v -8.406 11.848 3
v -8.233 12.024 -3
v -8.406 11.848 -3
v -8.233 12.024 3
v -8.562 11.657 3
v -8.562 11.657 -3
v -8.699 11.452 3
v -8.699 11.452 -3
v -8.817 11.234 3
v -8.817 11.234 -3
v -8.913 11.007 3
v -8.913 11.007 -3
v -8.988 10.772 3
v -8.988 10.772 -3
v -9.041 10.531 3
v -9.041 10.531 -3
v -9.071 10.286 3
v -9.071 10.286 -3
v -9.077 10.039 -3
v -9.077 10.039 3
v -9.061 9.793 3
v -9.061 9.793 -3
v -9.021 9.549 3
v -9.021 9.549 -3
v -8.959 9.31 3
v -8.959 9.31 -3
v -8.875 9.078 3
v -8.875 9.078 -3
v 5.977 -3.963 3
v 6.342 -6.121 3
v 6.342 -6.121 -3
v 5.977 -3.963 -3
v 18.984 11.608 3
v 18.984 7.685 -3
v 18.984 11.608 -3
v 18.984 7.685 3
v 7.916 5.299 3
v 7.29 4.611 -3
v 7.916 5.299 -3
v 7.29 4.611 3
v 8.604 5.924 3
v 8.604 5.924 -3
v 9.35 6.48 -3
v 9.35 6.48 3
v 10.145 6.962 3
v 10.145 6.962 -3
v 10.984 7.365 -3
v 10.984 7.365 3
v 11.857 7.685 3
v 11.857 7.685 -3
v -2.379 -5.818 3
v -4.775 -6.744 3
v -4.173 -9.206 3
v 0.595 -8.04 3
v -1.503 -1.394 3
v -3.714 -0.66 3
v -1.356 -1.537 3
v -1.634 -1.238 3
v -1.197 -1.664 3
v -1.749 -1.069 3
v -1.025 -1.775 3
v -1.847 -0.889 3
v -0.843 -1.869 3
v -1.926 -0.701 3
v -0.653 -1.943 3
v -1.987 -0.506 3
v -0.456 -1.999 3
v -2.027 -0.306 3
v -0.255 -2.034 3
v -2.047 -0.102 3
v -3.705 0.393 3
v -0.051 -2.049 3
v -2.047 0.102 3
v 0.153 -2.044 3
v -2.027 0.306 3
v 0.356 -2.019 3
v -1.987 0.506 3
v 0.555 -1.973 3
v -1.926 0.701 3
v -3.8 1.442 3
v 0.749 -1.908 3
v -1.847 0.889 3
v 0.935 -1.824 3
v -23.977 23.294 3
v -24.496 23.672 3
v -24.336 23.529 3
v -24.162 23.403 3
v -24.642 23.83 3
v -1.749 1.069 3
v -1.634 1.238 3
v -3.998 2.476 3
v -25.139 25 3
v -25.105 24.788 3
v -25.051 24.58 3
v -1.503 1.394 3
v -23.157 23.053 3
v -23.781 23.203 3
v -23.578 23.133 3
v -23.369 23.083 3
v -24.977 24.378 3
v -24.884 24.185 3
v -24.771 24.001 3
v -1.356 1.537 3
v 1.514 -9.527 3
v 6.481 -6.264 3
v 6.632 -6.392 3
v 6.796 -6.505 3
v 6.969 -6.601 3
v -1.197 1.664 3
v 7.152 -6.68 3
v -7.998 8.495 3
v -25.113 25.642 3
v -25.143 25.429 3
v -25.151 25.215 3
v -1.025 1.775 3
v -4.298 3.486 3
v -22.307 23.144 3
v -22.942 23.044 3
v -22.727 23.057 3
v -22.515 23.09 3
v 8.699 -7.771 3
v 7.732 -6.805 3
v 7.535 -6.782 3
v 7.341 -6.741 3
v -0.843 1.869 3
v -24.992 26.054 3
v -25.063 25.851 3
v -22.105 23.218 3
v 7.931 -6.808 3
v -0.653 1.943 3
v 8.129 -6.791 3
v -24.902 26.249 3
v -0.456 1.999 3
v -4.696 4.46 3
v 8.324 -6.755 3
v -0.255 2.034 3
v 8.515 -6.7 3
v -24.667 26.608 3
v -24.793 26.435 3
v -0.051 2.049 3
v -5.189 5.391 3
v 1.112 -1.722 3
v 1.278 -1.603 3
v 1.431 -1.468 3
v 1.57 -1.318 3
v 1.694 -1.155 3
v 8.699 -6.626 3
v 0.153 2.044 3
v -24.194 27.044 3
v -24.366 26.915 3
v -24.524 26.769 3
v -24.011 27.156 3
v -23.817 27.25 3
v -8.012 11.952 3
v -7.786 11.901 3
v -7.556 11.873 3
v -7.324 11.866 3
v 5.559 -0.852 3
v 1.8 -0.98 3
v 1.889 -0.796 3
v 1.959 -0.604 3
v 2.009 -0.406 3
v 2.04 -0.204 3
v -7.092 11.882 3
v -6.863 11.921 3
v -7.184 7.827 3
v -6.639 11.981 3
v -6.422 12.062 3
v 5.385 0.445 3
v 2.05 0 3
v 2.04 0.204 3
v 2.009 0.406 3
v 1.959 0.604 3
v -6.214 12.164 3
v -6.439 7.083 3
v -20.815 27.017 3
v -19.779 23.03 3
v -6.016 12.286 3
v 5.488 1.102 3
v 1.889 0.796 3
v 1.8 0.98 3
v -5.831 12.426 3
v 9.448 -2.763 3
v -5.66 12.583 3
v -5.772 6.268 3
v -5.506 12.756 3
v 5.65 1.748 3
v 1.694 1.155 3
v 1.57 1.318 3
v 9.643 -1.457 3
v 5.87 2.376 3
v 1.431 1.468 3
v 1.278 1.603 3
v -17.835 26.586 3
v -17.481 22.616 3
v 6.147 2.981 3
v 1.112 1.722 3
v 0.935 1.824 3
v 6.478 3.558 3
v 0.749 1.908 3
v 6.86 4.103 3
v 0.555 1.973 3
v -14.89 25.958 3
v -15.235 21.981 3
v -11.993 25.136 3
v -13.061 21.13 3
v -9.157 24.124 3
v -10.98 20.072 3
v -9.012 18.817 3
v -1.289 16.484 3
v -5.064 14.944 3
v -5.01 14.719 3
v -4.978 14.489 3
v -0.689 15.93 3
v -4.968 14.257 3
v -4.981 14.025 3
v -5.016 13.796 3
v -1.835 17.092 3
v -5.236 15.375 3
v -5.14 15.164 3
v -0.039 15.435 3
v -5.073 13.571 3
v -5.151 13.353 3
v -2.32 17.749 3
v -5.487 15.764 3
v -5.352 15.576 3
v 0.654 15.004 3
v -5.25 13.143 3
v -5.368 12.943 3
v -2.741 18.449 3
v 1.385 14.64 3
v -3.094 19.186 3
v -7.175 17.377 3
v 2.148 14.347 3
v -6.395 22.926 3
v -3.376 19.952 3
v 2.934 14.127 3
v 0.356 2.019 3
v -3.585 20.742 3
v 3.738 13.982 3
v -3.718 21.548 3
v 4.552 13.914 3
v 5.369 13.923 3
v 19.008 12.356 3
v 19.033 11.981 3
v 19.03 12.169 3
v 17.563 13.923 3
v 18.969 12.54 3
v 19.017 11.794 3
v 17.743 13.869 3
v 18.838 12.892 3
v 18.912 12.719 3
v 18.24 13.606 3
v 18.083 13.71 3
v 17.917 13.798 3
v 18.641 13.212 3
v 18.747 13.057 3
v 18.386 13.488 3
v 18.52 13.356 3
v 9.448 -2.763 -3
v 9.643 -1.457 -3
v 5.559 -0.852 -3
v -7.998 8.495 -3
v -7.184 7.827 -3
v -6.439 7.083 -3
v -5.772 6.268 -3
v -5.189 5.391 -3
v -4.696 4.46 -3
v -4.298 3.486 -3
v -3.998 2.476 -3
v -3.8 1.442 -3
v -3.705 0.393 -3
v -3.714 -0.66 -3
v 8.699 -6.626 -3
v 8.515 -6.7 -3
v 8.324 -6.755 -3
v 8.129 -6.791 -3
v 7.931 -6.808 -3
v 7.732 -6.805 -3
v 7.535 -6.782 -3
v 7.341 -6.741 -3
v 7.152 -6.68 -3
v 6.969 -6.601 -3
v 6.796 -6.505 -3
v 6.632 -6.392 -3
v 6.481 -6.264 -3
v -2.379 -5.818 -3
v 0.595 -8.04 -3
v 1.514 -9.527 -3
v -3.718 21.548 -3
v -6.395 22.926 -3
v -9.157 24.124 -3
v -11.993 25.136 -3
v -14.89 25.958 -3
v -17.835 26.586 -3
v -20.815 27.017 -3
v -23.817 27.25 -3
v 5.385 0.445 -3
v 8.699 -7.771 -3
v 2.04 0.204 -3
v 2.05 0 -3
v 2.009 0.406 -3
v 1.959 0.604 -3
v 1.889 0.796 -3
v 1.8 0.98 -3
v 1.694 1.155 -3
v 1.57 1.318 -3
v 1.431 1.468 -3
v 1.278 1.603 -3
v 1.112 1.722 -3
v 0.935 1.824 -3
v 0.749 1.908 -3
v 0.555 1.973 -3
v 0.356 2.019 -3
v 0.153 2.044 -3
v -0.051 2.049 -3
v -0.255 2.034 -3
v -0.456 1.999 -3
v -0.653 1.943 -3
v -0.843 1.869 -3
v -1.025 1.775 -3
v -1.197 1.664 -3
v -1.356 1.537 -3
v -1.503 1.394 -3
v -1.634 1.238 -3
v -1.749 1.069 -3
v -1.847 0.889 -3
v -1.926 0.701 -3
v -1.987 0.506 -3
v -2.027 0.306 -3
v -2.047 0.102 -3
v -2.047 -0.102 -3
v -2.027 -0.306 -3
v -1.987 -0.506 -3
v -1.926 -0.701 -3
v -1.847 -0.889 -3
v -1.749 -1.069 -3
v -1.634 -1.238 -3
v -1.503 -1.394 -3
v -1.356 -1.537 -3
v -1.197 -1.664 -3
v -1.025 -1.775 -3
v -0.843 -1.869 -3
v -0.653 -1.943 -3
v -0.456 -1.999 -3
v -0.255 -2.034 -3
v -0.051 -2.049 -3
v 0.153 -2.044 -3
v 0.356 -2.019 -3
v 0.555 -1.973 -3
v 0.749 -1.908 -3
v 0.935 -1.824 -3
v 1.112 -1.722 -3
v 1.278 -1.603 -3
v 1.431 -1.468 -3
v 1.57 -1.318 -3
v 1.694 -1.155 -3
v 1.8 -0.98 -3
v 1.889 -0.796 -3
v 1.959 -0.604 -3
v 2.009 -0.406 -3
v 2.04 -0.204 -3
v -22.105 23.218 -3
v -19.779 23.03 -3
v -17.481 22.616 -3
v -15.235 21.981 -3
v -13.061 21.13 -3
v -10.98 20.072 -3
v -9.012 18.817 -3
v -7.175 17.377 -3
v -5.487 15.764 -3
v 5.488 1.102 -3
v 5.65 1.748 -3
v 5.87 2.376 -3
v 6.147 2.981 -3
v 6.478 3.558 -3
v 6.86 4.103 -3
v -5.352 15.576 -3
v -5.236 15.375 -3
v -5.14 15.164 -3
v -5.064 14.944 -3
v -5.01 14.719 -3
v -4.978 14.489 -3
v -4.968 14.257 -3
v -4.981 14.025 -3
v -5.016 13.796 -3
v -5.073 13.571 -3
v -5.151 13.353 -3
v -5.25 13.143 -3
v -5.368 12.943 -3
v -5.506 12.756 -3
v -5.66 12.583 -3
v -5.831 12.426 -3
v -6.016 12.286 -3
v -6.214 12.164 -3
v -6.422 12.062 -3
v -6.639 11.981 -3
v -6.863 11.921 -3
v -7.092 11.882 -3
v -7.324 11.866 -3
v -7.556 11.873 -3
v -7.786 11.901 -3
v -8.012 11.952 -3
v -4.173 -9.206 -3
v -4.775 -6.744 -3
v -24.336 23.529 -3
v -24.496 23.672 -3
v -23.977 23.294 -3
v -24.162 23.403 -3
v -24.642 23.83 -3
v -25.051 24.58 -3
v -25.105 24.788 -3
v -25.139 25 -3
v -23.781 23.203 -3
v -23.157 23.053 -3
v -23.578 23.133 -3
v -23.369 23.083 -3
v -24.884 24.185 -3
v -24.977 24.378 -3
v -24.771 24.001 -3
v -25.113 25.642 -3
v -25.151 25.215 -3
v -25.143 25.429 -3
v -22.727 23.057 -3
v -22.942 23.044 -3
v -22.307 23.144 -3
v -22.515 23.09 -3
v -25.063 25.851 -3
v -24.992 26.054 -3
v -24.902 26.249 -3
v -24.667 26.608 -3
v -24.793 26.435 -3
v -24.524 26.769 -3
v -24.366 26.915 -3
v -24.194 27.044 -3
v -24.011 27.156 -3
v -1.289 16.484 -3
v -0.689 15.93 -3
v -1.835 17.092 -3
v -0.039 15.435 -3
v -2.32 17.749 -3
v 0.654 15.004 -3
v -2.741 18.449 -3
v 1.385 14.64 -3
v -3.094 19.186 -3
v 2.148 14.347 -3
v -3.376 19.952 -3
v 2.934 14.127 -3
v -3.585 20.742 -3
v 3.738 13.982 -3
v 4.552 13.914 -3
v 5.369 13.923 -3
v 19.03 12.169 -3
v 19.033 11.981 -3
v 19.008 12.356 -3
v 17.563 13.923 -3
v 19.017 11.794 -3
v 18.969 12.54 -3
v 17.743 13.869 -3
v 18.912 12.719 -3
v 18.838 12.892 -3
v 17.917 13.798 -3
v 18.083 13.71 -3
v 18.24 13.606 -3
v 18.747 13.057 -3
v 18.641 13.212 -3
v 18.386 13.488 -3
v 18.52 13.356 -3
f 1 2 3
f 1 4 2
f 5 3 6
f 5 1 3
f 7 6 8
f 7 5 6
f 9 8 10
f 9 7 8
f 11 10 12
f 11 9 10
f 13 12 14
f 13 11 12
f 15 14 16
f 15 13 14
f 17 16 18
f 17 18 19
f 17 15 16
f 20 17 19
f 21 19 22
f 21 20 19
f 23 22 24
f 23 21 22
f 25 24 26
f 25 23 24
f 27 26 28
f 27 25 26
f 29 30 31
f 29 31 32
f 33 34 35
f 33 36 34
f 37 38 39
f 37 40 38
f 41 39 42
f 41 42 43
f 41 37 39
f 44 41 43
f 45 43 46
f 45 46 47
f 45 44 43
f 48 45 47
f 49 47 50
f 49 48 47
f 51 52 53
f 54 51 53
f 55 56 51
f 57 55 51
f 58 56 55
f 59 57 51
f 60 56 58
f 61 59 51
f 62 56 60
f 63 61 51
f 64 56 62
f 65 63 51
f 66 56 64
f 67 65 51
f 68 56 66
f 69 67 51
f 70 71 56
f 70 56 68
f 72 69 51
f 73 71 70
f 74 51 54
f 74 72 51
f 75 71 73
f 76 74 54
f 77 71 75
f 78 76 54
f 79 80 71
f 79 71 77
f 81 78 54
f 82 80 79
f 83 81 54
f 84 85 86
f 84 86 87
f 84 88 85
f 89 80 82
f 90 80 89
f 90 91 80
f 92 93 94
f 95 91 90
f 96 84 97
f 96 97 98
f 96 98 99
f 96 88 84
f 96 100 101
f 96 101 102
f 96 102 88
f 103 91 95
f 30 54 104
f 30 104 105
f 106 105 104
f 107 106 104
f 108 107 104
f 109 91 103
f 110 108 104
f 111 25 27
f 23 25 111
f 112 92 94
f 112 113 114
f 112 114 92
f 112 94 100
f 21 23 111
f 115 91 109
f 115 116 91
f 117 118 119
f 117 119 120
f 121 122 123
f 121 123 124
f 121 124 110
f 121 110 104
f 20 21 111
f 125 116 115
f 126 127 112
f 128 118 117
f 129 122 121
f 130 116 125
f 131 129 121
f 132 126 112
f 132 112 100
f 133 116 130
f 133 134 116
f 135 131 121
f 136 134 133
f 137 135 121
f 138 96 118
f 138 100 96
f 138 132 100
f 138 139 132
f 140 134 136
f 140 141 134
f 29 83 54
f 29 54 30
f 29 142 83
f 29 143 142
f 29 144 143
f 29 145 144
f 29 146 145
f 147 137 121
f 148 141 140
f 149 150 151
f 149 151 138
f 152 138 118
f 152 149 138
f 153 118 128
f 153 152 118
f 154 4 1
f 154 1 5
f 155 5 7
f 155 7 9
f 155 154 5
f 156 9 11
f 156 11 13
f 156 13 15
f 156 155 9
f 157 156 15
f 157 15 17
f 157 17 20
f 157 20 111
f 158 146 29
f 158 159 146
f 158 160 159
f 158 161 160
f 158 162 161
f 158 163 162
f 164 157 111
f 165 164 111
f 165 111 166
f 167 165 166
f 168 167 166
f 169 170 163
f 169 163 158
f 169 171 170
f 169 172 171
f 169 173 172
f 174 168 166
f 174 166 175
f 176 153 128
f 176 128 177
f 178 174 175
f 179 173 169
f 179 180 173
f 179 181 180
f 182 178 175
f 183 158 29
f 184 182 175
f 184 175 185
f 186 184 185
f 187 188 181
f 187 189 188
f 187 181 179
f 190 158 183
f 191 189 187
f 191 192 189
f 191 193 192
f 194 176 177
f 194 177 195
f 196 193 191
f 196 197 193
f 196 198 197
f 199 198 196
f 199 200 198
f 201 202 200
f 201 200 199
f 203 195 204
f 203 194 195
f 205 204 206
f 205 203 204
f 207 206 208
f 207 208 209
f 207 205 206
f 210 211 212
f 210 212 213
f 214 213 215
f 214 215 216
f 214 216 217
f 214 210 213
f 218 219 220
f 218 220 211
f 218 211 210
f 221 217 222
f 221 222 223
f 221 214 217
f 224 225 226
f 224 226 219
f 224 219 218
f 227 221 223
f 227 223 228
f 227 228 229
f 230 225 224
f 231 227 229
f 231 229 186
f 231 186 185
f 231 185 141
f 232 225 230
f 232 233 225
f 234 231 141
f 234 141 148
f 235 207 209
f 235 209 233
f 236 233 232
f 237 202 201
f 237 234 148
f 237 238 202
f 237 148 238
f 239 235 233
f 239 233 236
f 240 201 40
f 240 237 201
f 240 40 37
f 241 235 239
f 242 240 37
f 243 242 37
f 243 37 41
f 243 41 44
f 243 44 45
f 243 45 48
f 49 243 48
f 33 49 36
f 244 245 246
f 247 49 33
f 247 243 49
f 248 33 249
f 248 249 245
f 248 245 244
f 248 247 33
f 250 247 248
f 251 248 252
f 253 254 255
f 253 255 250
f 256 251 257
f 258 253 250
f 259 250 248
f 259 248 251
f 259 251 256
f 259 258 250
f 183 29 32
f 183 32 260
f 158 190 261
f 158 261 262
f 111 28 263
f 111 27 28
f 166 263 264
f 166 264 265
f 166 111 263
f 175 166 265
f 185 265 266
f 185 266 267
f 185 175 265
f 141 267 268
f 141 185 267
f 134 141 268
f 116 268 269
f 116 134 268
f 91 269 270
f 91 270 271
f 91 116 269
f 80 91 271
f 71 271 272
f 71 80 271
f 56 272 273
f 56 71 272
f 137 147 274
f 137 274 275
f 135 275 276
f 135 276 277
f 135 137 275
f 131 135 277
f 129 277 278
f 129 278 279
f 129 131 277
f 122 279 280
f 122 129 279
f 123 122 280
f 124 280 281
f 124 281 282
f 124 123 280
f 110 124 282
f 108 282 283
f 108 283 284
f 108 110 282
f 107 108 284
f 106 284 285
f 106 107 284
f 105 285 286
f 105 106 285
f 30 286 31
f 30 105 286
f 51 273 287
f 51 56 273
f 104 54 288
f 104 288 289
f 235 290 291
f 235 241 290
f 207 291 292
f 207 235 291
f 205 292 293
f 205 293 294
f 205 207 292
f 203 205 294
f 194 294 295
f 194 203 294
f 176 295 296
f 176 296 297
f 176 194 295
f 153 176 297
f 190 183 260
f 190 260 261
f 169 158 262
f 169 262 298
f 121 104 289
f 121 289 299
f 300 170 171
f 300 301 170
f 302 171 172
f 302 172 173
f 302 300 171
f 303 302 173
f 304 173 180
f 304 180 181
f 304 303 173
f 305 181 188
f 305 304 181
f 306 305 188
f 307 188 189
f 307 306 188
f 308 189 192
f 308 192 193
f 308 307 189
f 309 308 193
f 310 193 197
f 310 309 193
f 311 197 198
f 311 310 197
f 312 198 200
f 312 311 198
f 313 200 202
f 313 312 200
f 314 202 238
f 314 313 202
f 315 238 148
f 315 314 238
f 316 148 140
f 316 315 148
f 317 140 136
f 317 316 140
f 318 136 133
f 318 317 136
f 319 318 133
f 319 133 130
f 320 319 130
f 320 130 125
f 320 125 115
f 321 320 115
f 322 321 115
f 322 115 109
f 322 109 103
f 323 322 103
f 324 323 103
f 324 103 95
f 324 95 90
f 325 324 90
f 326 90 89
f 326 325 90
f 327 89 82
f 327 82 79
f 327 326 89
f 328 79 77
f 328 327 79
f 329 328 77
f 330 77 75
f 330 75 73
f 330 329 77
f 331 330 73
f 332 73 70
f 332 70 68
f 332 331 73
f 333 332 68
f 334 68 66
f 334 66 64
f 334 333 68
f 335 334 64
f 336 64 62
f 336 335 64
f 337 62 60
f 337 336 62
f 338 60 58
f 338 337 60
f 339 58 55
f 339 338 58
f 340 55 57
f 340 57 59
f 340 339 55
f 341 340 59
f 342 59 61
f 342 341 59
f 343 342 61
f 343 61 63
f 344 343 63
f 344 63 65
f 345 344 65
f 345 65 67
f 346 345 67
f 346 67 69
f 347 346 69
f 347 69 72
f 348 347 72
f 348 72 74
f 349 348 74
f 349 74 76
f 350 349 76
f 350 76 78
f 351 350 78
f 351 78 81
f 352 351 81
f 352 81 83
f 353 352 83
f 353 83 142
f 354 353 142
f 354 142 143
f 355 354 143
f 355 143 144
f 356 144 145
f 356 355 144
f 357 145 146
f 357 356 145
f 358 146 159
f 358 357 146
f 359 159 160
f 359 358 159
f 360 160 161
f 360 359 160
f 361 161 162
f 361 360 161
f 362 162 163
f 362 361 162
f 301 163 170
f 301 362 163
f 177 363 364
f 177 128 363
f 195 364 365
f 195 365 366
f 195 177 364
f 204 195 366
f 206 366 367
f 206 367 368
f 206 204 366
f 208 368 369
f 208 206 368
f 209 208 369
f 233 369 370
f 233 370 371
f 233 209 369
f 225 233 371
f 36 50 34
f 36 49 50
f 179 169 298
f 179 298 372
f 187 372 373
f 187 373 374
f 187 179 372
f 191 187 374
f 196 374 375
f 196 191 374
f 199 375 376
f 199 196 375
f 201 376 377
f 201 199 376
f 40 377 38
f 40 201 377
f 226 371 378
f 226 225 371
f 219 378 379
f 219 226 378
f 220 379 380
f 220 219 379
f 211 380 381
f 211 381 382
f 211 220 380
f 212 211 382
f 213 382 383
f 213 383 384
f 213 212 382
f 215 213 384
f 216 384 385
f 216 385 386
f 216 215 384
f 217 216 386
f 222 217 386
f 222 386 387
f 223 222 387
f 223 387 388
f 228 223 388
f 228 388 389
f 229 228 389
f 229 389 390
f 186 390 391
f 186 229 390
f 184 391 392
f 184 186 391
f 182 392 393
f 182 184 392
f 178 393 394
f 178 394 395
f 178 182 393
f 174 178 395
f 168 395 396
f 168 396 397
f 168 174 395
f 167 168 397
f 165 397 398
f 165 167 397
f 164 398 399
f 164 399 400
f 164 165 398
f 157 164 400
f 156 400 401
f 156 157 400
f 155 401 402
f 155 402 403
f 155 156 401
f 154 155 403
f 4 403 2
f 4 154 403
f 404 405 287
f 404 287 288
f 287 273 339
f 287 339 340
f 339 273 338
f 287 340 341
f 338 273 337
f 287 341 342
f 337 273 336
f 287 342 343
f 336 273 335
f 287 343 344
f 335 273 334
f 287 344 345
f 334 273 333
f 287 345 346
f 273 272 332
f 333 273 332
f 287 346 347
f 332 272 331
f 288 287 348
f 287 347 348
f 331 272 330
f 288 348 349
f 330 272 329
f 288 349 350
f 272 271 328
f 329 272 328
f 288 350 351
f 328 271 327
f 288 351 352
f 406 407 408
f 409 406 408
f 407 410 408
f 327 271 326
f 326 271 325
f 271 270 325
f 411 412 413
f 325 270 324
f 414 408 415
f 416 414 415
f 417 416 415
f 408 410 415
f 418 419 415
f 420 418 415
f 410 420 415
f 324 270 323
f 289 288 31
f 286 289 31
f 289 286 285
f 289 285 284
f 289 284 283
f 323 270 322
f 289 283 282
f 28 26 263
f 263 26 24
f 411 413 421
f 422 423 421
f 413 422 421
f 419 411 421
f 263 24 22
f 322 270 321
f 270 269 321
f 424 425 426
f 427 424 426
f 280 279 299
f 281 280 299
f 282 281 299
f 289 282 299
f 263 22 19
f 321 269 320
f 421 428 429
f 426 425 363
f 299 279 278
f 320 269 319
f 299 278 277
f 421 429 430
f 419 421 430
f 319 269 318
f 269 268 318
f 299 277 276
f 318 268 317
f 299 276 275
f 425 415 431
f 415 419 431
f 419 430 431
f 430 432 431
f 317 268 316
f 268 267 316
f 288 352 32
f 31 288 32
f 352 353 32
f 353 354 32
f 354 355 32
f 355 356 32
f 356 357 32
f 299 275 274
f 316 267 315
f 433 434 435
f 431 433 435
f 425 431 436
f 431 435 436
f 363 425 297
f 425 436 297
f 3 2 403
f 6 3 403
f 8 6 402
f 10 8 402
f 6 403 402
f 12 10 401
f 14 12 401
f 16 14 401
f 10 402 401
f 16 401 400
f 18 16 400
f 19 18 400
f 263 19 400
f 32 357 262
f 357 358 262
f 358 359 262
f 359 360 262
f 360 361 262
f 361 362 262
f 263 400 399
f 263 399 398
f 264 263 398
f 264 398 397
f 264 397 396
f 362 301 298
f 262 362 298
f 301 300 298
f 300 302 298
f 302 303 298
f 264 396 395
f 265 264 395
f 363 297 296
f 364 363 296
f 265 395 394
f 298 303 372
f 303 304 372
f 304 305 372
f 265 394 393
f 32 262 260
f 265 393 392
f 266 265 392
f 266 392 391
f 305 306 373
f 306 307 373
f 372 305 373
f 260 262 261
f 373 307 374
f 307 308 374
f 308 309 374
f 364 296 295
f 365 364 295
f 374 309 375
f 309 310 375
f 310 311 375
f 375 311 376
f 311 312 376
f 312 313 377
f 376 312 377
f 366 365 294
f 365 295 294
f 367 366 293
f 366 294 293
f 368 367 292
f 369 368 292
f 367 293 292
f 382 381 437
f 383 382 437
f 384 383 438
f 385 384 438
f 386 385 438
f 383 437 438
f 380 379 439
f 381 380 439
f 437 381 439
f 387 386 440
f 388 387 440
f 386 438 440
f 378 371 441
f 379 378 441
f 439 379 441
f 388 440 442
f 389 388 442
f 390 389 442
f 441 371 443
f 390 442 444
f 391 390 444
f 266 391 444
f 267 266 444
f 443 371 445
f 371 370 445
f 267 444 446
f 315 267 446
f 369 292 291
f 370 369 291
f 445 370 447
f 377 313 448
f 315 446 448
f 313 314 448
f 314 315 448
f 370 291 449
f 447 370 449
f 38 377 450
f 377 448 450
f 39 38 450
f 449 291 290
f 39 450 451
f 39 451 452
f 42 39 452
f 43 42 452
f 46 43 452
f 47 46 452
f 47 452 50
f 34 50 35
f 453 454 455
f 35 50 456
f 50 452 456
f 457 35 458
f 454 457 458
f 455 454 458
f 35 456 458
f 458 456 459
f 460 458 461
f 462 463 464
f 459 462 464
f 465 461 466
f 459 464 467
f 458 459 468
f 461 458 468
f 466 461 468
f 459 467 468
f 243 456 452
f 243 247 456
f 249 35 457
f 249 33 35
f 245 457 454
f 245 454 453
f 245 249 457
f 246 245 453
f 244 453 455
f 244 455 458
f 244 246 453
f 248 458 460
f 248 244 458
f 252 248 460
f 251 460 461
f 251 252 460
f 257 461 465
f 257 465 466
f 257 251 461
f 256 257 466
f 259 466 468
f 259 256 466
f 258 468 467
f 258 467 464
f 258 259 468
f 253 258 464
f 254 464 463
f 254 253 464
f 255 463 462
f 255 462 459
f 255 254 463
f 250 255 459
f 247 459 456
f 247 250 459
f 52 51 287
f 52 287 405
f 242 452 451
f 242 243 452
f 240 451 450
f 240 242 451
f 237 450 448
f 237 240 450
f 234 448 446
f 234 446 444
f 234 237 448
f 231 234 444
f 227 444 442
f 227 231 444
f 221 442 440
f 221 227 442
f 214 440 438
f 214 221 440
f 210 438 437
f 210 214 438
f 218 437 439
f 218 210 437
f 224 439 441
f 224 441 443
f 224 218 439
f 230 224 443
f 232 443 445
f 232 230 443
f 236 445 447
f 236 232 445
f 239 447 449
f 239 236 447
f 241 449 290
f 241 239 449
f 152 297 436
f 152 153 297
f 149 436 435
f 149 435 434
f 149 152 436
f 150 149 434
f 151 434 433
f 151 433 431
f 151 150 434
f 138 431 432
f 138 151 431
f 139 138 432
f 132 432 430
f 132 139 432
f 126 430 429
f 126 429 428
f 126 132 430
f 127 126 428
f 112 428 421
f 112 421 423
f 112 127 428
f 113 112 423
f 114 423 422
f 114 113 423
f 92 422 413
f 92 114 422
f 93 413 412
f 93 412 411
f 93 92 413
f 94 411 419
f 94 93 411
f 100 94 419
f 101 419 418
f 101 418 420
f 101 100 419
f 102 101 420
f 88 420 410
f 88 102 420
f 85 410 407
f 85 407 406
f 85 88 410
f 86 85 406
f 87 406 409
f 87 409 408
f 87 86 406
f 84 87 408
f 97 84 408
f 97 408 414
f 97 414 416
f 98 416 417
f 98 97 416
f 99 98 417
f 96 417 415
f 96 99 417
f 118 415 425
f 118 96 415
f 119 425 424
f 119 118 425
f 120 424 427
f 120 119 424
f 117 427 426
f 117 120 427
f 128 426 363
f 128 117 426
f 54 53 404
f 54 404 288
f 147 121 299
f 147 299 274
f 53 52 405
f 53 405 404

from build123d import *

# Parameters (mm, degrees)
SKETCH_1_R      = 2.05
EXTRUDE_1_DEPTH = 3


with BuildPart() as part:
    # 스케치1 → 보스-돌출1 (new, symmetric)
    with BuildSketch(Plane.XY):
        with BuildLine():
            Line((-3.714453644, -0.659762387), (-2.378622648, -5.81789167))
            Line((-2.378622648, -5.81789167), (-4.775045742, -6.743825318))
            Line((-4.775045742, -6.743825318), (-4.17347403, -9.205553558))
            Line((-4.17347403, -9.205553558), (0.595403586, -8.040184518))
            Line((0.595403586, -8.040184518), (1.5135427, -9.526878273))
            Line((1.5135427, -9.526878273), (8.699439255, -7.770863118))
            Line((8.699439255, -7.770863118), (8.699439255, -6.62630488))
            ThreePointArc((8.699439255, -6.62630488), (7.437294697, -6.763917269), (6.342454802, -6.121055183))
            Line((6.342454802, -6.121055183), (5.976753085, -3.963411438))
            Line((5.976753085, -3.963411438), (9.448395839, -2.762750085))
            Line((9.448395839, -2.762750085), (9.643145165, -1.456614425))
            Line((9.643145165, -1.456614425), (5.558763062, -0.851575902))
            Line((5.558763062, -0.851575902), (5.384598497, 0.445037535))
            ThreePointArc((5.384598497, 0.445037535), (6.001978603, 2.68132709), (7.290465917, 4.61056259))
            ThreePointArc((7.290465917, 4.61056259), (9.349741981, 6.480399593), (11.856878684, 7.685046382))
            Line((11.856878684, 7.685046382), (18.984206684, 7.685046382))
            Line((18.984206684, 7.685046382), (18.984206684, 11.608441399))
            ThreePointArc((18.984206684, 11.608441399), (18.747143867, 13.056663145), (17.562507461, 13.922793382))
            Line((17.562507461, 13.922793382), (5.368815069, 13.922793382))
            ThreePointArc((5.368815069, 13.922793382), (-0.689207057, 15.930226431), (-3.717586974, 21.547906968))
            ThreePointArc((-3.717586974, 21.547906968), (-13.434946181, 25.571091327), (-23.817349178, 27.25001668))
            ThreePointArc((-23.817349178, 27.25001668), (-24.977134733, 24.378166735), (-22.105284788, 23.21838118))
            ThreePointArc((-22.105284788, 23.21838118), (-13.06126812, 21.129967821), (-5.487273706, 15.764306963))
            ThreePointArc((-5.487273706, 15.764306963), (-5.434873097, 12.848146862), (-8.232673416, 12.024102607))
            ThreePointArc((-8.232673416, 12.024102607), (-9.017409998, 10.65199102), (-8.87513846, 9.077741828))
            ThreePointArc((-8.87513846, 9.077741828), (-4.931237162, 4.931648988), (-3.714453644, -0.659762387))
        make_face()
        Circle(SKETCH_1_R, mode=Mode.SUBTRACT)
    extrude(amount=EXTRUDE_1_DEPTH, both=True)


solid = part.part
